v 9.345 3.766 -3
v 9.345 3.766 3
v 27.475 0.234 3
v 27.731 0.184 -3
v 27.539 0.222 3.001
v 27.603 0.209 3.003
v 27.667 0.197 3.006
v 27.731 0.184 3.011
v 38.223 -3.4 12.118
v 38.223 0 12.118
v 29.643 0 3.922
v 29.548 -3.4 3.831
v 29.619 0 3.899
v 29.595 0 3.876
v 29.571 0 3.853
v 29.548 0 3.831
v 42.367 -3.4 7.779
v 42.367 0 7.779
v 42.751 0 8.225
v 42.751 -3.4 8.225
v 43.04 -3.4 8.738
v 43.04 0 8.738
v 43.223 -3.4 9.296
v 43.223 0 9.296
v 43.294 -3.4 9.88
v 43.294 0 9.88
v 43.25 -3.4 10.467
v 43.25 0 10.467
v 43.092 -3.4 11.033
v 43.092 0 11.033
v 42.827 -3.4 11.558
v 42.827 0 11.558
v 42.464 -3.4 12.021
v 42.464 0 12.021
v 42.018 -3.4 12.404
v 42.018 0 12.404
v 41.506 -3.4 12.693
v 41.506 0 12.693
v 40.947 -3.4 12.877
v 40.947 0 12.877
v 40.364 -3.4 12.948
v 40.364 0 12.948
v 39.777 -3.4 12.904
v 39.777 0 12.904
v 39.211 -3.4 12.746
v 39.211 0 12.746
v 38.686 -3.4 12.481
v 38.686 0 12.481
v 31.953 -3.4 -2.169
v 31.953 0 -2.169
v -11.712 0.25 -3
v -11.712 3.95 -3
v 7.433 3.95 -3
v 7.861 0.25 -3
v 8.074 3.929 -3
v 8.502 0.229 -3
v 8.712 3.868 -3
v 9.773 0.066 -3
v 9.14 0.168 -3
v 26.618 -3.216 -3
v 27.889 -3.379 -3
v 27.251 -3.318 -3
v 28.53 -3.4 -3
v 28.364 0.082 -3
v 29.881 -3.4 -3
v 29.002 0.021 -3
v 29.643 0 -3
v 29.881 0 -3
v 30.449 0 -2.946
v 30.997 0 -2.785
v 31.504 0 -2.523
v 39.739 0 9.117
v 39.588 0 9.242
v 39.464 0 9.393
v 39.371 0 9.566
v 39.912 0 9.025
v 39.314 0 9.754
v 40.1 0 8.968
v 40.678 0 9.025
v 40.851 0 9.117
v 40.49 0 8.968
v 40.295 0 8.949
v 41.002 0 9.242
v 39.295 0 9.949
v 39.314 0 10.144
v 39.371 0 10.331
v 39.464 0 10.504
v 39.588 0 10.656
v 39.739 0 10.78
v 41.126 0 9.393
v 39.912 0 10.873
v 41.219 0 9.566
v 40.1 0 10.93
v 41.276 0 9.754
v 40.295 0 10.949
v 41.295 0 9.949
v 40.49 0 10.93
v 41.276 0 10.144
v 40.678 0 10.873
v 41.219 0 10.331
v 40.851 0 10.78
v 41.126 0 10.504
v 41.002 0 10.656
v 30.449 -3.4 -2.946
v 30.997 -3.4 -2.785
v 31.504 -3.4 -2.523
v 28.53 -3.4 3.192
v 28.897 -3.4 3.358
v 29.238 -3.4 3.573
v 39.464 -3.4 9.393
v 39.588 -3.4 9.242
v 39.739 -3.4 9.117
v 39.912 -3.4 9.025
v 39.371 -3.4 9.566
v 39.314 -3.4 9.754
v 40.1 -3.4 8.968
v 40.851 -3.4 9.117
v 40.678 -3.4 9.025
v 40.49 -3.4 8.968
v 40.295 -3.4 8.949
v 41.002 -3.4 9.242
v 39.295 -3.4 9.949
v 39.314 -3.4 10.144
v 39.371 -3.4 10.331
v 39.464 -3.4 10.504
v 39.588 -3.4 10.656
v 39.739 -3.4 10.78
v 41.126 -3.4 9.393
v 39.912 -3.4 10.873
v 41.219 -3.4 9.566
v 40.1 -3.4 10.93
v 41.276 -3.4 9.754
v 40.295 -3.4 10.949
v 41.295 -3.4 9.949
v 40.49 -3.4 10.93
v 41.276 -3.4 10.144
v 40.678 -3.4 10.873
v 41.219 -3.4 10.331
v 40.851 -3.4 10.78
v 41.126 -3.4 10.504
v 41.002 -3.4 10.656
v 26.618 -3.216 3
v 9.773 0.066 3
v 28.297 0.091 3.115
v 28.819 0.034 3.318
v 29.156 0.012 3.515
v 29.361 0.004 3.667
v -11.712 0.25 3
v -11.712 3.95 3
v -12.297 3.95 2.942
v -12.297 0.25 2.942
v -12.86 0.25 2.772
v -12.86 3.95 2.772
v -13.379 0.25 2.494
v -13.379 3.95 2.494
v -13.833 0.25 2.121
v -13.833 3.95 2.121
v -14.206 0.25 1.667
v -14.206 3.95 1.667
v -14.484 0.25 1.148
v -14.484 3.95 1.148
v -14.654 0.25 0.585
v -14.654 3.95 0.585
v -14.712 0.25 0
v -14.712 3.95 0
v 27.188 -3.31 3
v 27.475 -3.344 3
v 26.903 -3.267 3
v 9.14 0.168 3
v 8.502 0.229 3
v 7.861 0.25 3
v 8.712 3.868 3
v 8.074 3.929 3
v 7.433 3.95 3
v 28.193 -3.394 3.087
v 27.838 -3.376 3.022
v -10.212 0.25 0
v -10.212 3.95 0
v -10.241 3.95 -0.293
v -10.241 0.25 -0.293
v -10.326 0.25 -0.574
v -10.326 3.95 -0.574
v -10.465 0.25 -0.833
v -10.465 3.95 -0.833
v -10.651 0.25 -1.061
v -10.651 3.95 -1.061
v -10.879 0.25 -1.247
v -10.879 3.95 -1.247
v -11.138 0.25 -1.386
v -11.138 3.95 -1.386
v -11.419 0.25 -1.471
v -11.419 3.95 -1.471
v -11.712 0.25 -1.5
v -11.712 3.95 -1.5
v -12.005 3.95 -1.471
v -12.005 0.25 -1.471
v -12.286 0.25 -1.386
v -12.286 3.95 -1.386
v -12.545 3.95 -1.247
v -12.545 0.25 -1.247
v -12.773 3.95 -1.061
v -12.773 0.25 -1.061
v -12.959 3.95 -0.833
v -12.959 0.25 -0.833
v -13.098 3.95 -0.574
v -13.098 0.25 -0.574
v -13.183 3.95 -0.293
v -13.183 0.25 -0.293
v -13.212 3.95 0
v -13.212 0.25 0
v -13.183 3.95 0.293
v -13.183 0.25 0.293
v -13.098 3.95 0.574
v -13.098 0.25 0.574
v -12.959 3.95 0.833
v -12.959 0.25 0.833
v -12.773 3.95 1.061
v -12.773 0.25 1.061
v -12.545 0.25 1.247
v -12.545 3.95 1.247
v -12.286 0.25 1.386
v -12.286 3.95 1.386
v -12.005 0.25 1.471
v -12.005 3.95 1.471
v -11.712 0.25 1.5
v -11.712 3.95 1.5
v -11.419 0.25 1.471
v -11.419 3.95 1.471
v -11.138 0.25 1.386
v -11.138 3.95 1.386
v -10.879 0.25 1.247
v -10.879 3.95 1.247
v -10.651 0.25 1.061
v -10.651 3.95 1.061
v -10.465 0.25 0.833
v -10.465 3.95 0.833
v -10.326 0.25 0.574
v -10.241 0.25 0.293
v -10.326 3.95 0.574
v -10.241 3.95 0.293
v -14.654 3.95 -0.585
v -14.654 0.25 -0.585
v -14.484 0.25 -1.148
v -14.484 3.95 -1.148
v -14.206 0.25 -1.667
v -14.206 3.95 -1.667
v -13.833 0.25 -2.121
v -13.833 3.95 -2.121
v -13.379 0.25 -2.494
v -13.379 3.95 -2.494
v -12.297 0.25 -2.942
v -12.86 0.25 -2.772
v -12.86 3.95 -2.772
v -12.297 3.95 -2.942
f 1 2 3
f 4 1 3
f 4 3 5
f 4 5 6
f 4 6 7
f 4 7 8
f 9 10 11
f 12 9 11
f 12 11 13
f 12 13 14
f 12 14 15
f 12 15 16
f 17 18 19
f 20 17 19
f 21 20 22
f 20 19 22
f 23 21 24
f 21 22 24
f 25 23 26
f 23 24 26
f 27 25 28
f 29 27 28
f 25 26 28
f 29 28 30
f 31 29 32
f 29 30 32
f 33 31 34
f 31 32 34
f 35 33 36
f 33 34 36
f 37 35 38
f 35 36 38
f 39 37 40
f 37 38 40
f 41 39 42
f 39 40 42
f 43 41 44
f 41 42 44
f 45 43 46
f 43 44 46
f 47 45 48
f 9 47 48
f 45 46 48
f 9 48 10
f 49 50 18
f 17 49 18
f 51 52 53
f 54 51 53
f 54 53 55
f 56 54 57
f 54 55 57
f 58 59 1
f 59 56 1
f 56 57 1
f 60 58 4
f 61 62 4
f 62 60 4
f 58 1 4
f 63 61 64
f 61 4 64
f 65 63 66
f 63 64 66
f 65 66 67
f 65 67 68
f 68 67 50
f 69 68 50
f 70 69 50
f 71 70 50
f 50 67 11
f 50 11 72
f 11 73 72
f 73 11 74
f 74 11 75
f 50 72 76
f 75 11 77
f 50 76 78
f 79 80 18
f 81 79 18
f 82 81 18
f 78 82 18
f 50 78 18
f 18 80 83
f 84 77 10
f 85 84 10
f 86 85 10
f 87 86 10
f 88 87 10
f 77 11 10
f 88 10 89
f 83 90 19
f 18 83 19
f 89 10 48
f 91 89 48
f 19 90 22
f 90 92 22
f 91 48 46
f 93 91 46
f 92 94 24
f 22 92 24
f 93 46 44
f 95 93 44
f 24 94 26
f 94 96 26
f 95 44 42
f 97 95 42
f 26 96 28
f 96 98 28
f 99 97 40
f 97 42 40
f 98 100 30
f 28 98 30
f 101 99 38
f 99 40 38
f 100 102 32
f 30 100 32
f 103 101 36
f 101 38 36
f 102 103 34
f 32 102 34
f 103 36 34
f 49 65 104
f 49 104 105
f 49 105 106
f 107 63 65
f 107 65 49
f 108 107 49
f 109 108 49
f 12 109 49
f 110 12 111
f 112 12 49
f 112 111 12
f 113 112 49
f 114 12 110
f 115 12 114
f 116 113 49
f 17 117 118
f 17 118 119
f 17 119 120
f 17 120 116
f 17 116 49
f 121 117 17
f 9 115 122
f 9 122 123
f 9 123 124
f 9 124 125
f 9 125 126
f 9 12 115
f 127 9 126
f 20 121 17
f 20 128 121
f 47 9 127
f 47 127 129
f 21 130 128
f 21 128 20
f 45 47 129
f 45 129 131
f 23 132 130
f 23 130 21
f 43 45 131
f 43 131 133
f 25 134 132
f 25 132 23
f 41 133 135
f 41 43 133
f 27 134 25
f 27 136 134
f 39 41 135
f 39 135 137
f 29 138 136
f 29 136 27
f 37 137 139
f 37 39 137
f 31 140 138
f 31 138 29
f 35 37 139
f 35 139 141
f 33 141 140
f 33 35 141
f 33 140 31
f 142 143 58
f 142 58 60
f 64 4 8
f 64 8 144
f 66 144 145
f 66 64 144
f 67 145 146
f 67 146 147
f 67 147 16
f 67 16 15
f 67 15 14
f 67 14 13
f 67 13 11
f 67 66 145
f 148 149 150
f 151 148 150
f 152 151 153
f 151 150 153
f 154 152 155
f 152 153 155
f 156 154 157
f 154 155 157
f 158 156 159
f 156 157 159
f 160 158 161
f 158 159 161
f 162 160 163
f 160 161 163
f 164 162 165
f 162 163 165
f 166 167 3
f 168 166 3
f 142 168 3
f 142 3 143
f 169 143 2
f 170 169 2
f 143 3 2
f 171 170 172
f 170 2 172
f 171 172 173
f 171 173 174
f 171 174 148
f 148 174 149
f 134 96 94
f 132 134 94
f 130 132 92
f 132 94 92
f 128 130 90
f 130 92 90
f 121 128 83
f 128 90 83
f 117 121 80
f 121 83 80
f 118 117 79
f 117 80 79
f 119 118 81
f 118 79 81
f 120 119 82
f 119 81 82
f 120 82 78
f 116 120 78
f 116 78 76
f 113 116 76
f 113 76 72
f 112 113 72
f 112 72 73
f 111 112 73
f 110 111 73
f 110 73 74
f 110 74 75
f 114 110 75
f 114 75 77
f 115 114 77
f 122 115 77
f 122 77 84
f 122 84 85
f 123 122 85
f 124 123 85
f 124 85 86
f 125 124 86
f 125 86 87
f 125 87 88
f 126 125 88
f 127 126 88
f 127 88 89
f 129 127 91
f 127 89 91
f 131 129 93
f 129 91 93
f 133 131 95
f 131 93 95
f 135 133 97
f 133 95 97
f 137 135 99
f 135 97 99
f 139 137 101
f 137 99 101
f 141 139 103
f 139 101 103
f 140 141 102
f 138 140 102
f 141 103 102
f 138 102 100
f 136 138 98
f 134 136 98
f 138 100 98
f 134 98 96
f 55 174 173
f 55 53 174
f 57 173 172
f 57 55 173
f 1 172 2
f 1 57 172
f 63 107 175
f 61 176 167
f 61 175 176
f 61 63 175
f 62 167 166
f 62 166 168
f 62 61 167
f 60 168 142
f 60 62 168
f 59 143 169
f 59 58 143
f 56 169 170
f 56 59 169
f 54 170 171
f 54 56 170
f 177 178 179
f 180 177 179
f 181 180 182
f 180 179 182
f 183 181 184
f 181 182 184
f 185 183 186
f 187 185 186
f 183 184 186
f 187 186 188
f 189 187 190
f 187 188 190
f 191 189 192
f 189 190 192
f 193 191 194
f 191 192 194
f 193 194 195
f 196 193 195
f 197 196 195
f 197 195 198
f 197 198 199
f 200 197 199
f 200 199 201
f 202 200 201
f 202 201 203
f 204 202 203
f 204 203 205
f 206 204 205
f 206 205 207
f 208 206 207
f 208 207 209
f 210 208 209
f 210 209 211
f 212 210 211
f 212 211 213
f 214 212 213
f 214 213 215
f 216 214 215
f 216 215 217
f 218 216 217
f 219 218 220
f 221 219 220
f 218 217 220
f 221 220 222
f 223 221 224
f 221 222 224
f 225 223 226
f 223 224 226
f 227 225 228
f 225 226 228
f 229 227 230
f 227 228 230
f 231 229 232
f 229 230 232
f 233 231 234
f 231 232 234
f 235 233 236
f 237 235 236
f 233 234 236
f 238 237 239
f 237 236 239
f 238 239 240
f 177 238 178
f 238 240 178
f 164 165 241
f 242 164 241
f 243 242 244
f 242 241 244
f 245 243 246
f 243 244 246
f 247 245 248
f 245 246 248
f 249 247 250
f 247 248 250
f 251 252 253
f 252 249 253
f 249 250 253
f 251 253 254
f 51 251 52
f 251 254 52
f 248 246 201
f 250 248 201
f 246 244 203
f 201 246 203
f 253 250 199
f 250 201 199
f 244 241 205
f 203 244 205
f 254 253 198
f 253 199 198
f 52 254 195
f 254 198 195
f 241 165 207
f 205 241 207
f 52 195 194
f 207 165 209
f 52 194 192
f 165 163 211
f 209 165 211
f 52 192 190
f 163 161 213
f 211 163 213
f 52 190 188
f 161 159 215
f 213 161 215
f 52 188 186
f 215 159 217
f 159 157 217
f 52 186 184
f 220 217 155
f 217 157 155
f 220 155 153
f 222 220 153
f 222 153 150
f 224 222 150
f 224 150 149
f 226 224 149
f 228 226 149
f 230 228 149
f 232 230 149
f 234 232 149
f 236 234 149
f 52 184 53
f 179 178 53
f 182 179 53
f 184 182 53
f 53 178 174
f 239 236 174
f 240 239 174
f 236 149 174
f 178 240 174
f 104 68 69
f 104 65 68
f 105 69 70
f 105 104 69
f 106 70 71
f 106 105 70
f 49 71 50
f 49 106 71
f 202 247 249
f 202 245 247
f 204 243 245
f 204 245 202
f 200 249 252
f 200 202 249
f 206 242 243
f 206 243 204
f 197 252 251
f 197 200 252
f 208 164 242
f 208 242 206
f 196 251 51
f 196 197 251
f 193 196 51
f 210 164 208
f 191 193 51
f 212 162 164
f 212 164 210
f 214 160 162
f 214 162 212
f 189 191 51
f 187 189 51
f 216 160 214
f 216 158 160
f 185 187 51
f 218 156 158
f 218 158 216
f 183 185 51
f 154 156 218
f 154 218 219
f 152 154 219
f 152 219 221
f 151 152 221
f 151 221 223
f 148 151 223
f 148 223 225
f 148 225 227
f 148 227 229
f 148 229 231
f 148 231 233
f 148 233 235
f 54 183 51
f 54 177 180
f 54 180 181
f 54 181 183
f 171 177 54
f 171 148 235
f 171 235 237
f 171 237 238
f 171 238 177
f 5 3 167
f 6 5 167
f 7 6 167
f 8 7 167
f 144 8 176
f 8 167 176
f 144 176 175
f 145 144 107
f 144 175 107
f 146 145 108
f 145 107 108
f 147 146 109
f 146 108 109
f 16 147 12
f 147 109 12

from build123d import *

# Parameters (mm, degrees)
BOSS_EXTRUDE1_DEPTH     = 3
BOSS_EXTRUDE2_DEPTH     = 3.4
CUT_EXTRUDE1_DEPTH      = 1
CUT_EXTRUDE1_DEPTH_BACK = 8.35
CUT_EXTRUDE2_DEPTH      = 10.948718941
CUT_EXTRUDE2_DEPTH_BACK = 7
SKETCH6_R               = 1.5
SKETCH6_R_2             = 1
CUT_EXTRUDE4_DEPTH      = 1
CUT_EXTRUDE4_DEPTH_BACK = 8.35
FILLET1_R               = 10
FILLET2_R               = 3


with BuildPart() as part:
    # Sketch1 → Boss-Extrude1 (new body, symmetric)
    with BuildSketch(Plane.XY):
        Polygon((-14.712036777, 3.95), (8.397963223, 3.95), (28.677963223, 0), (-14.712036777, 0), align=None)
    extrude(amount=BOSS_EXTRUDE1_DEPTH, both=True)

    # Sketch2 → Boss-Extrude2 (add)
    with BuildSketch(Plane.XZ):
        with BuildLine():
            Line((-11.712036777, -3), (31.08325999, -3))
            Line((31.08325999, -3), (42.367258396, 7.779455791))
            ThreePointArc((42.367258396, 7.779455791), (42.464252889, 12.020987598), (38.222721082, 12.117982091))
            Line((38.222721082, 12.117982091), (28.677963223, 3))
            Line((28.677963223, 3), (-11.712036777, 3))
            ThreePointArc((-11.712036777, 3), (-14.712036777, 0), (-11.712036777, -3))
        make_face()
    extrude(amount=BOSS_EXTRUDE2_DEPTH)

    # Sketch3 → Cut-Extrude1 (cut, two sides)
    with BuildSketch(Plane(origin=(0, 3.95, 0), x_dir=(1, 0, 0), z_dir=(0, 1, 0))) as cut_extrude1_sk:
        with BuildLine():
            ThreePointArc((-14.712036777, 0), (-13.833357121, 2.121320344), (-11.712036777, 3))
            Line((-11.712036777, 3), (-14.712036777, 3))
            Line((-14.712036777, 3), (-14.712036777, 0))
        make_face()
        with BuildLine():
            ThreePointArc((-11.712036777, -3), (-13.833357121, -2.121320344), (-14.712036777, 0))
            Line((-14.712036777, 0), (-14.712036777, -3))
            Line((-14.712036777, -3), (-11.712036777, -3))
        make_face()
    extrude(amount=CUT_EXTRUDE1_DEPTH, mode=Mode.SUBTRACT)
    extrude(cut_extrude1_sk.sketch, amount=-CUT_EXTRUDE1_DEPTH_BACK, mode=Mode.SUBTRACT)

    # Sketch4 → Cut-Extrude2 (cut, two sides)
    with BuildSketch(Plane.XY.offset(3)) as cut_extrude2_sk:
        Polygon((-14.712036777, 0.25), (8.825585542, 0.25), (27.565332378, -3.4), (-14.712036777, -3.4), align=None)
    extrude(amount=CUT_EXTRUDE2_DEPTH, mode=Mode.SUBTRACT)
    extrude(cut_extrude2_sk.sketch, amount=-CUT_EXTRUDE2_DEPTH_BACK, mode=Mode.SUBTRACT)

    # Sketch6 → Cut-Extrude4 (cut, two sides)
    with BuildSketch(Plane(origin=(0, 3.95, 0), x_dir=(1, 0, 0), z_dir=(0, 1, 0))) as cut_extrude4_sk:
        with Locations((-11.712036777, 0)):
            Circle(SKETCH6_R)
        with Locations((40.294989739, -9.948718941)):
            Circle(SKETCH6_R_2)
    extrude(amount=CUT_EXTRUDE4_DEPTH, mode=Mode.SUBTRACT)
    extrude(cut_extrude4_sk.sketch, amount=-CUT_EXTRUDE4_DEPTH_BACK, mode=Mode.SUBTRACT)

    # Fillet1
    fillet1_edges = [part.edges().sort_by_distance(p)[0] for p in [
        (8.397963223, 3.95, 0),
        (28.677963223, 0, 0),
        (27.565332378, -3.4, 0),
        (8.825585542, 0.25, 0),
    ]]
    fillet(fillet1_edges, radius=FILLET1_R)

    # Fillet2
    fillet2_edges = [part.edges().sort_by_distance(p)[0] for p in [
        (31.08325999, -1.7, -3),
        (28.677963223, -1.676674581, 3),
    ]]
    fillet(fillet2_edges, radius=FILLET2_R)


solid = part.part
